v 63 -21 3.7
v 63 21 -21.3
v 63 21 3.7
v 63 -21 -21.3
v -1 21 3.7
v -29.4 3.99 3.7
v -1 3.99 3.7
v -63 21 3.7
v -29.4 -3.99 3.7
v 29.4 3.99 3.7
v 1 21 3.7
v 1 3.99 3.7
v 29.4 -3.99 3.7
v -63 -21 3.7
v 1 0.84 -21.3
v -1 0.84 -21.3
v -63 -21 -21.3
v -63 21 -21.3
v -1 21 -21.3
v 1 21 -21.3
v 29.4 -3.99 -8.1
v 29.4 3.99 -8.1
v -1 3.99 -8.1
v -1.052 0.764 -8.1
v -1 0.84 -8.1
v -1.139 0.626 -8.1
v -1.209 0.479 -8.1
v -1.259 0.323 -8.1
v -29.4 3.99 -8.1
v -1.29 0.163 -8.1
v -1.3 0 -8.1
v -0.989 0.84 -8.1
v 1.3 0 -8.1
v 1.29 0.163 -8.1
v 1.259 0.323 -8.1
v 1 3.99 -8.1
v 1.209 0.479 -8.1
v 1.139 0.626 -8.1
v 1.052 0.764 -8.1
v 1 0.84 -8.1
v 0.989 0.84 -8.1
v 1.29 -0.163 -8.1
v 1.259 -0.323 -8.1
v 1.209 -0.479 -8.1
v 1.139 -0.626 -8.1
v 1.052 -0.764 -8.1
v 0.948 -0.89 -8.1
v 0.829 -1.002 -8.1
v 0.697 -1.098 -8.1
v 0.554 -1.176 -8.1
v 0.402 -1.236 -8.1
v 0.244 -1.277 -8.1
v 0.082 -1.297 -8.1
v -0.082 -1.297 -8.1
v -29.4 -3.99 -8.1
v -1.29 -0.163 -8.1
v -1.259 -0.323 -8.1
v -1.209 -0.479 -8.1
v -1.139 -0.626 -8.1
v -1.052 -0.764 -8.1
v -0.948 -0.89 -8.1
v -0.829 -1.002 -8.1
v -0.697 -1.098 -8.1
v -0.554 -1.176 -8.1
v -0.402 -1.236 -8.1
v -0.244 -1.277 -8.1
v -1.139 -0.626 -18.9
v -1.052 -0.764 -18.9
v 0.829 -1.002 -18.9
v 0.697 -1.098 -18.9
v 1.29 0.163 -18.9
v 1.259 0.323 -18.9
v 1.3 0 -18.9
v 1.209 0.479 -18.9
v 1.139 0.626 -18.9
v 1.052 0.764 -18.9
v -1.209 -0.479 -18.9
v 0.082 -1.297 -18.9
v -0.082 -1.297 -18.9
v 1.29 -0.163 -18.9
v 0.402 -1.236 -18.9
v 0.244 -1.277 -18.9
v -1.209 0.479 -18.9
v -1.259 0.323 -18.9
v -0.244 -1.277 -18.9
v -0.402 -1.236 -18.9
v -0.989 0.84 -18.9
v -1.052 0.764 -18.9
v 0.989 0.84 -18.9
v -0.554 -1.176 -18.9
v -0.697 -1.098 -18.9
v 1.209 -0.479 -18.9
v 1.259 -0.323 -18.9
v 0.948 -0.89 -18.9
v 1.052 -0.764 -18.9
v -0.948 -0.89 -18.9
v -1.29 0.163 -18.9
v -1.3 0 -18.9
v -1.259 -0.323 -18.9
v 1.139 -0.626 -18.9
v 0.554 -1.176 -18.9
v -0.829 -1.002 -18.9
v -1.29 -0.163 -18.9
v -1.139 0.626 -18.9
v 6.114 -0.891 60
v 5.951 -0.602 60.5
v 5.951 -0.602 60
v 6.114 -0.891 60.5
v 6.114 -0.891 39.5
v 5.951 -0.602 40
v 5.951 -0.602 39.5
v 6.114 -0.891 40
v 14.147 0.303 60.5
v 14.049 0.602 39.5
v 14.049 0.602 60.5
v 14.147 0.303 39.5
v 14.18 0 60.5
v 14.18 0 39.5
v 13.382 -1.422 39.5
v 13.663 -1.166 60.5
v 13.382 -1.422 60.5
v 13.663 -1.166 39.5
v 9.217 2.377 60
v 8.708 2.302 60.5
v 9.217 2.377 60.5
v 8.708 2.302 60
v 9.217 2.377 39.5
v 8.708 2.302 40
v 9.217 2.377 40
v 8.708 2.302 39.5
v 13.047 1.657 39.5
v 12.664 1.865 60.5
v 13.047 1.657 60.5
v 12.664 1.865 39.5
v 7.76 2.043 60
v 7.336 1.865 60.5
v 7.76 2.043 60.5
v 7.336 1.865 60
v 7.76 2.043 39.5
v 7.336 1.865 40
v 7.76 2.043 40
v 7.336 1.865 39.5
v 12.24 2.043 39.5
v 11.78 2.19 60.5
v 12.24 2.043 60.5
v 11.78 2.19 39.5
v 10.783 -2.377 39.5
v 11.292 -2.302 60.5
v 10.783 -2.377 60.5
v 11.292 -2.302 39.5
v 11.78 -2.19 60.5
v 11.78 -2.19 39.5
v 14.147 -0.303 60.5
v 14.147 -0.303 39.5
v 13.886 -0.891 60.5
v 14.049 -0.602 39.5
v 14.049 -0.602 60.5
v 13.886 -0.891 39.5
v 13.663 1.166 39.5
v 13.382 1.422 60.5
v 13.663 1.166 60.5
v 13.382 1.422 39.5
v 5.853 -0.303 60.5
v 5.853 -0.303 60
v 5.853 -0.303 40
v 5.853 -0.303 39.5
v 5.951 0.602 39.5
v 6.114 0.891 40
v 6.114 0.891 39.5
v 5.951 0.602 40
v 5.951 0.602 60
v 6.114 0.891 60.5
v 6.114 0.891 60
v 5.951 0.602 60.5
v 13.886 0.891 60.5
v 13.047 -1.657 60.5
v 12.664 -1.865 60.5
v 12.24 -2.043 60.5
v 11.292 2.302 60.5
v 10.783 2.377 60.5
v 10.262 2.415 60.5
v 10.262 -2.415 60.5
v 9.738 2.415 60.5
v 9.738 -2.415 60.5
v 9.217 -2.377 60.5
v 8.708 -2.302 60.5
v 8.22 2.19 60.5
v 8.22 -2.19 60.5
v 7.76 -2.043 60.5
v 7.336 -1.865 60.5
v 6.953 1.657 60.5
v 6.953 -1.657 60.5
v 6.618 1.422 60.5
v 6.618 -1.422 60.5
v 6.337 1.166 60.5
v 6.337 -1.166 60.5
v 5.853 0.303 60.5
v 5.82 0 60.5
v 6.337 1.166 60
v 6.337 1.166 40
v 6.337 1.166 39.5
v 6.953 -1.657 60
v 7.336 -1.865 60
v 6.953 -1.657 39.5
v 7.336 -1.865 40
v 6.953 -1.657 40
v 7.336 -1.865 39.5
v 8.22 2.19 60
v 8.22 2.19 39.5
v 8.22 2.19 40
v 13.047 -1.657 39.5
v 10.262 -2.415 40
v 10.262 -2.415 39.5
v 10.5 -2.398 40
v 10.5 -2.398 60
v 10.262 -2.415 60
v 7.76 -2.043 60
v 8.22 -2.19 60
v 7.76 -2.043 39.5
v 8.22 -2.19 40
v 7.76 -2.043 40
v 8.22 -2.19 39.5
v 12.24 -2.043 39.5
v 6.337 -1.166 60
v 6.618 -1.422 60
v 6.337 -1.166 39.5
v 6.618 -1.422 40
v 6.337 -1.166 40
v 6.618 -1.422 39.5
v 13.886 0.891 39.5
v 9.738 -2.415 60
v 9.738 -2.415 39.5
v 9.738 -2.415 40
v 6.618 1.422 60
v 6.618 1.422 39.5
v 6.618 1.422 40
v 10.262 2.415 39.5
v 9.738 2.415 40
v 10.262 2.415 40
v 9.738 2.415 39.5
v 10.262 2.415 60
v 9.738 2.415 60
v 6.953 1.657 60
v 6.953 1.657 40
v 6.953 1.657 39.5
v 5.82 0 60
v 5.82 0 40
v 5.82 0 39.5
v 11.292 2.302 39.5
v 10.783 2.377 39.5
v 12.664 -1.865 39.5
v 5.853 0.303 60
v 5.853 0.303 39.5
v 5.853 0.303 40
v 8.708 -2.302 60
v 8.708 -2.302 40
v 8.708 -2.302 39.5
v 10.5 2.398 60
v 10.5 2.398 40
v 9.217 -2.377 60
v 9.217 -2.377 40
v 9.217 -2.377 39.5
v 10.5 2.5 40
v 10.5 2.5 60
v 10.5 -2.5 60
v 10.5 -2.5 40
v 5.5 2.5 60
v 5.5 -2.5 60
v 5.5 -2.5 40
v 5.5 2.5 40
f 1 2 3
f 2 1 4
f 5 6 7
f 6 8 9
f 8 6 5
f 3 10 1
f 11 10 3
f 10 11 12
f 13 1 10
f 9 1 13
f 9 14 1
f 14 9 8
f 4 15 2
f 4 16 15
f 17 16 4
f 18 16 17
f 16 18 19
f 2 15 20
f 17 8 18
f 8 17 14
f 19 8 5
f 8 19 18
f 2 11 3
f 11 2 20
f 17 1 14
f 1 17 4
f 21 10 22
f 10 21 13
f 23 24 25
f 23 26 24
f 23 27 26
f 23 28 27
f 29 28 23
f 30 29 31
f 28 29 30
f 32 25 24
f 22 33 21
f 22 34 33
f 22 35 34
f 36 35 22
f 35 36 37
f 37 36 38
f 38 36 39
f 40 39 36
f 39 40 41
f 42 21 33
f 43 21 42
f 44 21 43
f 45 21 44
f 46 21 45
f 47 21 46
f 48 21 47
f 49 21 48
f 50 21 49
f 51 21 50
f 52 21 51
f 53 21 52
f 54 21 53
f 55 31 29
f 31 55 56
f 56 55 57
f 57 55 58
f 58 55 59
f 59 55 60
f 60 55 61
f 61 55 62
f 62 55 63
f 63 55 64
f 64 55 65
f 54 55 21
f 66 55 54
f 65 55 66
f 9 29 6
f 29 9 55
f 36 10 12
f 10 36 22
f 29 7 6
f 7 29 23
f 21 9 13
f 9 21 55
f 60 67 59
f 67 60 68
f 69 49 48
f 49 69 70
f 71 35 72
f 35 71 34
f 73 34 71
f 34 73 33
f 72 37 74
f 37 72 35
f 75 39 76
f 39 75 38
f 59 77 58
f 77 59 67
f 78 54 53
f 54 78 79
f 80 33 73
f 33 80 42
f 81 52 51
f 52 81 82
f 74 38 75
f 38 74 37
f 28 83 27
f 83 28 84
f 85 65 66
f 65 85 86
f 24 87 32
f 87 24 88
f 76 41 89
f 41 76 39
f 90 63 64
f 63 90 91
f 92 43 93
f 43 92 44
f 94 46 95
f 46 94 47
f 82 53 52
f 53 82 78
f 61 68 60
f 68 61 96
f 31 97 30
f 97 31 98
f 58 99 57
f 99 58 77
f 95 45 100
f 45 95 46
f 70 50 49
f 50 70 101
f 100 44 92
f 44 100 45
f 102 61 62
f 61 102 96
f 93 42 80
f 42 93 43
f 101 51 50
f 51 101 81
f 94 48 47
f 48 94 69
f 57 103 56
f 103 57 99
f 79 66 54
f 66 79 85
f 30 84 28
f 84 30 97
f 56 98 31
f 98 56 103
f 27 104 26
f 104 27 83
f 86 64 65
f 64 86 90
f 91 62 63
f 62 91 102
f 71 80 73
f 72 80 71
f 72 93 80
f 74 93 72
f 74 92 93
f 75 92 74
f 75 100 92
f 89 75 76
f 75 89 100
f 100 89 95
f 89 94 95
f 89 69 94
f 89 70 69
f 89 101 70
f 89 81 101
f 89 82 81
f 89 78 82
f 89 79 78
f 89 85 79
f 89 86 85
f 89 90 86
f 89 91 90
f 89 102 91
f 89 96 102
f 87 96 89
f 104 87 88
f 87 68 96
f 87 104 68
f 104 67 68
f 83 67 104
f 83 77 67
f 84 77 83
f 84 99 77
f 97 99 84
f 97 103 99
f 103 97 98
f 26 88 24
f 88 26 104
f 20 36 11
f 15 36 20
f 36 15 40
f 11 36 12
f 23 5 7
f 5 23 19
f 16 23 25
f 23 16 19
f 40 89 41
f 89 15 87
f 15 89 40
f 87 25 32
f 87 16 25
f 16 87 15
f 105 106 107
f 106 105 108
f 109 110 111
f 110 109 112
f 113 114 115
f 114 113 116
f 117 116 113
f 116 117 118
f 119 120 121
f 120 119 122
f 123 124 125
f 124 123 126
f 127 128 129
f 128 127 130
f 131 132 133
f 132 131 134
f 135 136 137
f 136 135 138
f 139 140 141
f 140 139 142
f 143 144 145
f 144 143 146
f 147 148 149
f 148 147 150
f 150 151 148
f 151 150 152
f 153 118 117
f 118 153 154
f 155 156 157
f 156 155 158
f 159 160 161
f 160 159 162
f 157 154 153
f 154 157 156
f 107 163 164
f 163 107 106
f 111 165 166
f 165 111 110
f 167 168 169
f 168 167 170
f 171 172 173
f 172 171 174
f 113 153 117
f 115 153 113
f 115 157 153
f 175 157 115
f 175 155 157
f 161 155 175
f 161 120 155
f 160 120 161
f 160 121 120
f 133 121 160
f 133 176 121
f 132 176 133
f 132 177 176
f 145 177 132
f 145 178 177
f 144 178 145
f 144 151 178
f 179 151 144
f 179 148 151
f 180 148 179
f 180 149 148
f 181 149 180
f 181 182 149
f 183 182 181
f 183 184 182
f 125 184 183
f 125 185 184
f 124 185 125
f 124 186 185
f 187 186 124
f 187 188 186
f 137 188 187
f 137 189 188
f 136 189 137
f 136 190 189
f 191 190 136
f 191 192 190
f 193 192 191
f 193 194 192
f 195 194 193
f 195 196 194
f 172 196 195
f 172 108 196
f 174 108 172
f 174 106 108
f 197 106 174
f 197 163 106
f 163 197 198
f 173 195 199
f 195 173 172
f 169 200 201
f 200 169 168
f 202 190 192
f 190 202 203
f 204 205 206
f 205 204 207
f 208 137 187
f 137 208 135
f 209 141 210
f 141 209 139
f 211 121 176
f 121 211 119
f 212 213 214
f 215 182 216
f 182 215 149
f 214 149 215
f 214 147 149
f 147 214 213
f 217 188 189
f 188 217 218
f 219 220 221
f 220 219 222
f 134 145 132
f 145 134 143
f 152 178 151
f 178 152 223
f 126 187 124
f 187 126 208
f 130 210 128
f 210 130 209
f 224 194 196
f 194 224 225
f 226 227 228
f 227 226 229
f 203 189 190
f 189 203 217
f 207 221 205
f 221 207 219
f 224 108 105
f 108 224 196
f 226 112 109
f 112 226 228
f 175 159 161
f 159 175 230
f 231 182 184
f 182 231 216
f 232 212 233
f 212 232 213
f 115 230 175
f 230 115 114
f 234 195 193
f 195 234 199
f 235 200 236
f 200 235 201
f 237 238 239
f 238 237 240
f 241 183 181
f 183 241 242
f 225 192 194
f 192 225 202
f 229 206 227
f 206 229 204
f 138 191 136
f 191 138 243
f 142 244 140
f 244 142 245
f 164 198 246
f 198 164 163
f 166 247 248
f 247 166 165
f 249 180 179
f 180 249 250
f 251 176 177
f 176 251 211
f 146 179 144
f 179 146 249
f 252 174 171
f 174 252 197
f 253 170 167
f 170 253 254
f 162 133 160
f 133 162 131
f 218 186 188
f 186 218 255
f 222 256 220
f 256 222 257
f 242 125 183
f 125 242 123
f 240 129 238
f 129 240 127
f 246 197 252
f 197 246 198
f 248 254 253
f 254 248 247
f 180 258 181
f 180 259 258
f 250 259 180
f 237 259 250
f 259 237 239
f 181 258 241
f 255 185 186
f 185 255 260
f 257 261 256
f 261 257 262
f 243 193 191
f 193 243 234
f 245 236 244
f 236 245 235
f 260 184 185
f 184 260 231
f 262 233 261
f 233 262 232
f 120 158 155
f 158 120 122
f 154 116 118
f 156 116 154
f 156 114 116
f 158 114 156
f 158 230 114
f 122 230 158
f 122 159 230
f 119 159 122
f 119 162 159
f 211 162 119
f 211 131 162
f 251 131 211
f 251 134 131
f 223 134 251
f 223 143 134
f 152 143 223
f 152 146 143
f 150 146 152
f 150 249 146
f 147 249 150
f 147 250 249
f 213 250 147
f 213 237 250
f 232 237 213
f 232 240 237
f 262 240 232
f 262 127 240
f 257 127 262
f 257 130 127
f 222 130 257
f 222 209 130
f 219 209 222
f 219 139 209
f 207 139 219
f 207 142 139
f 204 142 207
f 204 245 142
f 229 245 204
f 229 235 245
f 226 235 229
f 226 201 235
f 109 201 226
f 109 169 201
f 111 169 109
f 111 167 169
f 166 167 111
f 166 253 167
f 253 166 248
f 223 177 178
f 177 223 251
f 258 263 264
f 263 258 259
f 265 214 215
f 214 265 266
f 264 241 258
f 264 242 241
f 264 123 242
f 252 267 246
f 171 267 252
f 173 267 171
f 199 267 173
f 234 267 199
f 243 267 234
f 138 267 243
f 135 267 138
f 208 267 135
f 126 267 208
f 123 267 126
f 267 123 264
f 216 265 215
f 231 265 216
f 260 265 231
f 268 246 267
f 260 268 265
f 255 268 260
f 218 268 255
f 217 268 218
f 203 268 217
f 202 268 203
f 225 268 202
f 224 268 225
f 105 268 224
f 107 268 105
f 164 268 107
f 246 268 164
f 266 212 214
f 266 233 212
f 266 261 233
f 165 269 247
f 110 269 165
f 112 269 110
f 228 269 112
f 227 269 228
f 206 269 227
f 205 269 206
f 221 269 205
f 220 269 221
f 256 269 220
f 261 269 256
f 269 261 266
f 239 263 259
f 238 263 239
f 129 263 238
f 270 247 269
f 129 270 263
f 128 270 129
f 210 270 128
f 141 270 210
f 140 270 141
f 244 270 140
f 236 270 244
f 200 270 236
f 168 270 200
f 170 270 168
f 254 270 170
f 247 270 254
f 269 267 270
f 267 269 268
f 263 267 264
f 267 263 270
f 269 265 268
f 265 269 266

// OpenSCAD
difference(){
	translate([0,0,-8.8]) cube(size = [126,42,25], center = true);
	translate([0,0,-2.1]) color("green") cube(size = [58.8,7.98,12], center = true);
		
	translate([0,0,-12.6]) cylinder(h = 12.6, r=1.30,$fn=50, center=true);	
	translate([0,15.54,-4.2]) color("blue") cube(size = [2,29.4,37.8], center=true);
}
module connector(x,y,z){
	translate([x,y,z])
	union(){
	scale([1.9,1.1,1])  cylinder(h = 21, r=2.2,$fn=50, center=true);
	color("red") translate([-2,0,0]) cube(size = [5,5,20], center = true);
	
	}
	
}

connector(10,0,50);
